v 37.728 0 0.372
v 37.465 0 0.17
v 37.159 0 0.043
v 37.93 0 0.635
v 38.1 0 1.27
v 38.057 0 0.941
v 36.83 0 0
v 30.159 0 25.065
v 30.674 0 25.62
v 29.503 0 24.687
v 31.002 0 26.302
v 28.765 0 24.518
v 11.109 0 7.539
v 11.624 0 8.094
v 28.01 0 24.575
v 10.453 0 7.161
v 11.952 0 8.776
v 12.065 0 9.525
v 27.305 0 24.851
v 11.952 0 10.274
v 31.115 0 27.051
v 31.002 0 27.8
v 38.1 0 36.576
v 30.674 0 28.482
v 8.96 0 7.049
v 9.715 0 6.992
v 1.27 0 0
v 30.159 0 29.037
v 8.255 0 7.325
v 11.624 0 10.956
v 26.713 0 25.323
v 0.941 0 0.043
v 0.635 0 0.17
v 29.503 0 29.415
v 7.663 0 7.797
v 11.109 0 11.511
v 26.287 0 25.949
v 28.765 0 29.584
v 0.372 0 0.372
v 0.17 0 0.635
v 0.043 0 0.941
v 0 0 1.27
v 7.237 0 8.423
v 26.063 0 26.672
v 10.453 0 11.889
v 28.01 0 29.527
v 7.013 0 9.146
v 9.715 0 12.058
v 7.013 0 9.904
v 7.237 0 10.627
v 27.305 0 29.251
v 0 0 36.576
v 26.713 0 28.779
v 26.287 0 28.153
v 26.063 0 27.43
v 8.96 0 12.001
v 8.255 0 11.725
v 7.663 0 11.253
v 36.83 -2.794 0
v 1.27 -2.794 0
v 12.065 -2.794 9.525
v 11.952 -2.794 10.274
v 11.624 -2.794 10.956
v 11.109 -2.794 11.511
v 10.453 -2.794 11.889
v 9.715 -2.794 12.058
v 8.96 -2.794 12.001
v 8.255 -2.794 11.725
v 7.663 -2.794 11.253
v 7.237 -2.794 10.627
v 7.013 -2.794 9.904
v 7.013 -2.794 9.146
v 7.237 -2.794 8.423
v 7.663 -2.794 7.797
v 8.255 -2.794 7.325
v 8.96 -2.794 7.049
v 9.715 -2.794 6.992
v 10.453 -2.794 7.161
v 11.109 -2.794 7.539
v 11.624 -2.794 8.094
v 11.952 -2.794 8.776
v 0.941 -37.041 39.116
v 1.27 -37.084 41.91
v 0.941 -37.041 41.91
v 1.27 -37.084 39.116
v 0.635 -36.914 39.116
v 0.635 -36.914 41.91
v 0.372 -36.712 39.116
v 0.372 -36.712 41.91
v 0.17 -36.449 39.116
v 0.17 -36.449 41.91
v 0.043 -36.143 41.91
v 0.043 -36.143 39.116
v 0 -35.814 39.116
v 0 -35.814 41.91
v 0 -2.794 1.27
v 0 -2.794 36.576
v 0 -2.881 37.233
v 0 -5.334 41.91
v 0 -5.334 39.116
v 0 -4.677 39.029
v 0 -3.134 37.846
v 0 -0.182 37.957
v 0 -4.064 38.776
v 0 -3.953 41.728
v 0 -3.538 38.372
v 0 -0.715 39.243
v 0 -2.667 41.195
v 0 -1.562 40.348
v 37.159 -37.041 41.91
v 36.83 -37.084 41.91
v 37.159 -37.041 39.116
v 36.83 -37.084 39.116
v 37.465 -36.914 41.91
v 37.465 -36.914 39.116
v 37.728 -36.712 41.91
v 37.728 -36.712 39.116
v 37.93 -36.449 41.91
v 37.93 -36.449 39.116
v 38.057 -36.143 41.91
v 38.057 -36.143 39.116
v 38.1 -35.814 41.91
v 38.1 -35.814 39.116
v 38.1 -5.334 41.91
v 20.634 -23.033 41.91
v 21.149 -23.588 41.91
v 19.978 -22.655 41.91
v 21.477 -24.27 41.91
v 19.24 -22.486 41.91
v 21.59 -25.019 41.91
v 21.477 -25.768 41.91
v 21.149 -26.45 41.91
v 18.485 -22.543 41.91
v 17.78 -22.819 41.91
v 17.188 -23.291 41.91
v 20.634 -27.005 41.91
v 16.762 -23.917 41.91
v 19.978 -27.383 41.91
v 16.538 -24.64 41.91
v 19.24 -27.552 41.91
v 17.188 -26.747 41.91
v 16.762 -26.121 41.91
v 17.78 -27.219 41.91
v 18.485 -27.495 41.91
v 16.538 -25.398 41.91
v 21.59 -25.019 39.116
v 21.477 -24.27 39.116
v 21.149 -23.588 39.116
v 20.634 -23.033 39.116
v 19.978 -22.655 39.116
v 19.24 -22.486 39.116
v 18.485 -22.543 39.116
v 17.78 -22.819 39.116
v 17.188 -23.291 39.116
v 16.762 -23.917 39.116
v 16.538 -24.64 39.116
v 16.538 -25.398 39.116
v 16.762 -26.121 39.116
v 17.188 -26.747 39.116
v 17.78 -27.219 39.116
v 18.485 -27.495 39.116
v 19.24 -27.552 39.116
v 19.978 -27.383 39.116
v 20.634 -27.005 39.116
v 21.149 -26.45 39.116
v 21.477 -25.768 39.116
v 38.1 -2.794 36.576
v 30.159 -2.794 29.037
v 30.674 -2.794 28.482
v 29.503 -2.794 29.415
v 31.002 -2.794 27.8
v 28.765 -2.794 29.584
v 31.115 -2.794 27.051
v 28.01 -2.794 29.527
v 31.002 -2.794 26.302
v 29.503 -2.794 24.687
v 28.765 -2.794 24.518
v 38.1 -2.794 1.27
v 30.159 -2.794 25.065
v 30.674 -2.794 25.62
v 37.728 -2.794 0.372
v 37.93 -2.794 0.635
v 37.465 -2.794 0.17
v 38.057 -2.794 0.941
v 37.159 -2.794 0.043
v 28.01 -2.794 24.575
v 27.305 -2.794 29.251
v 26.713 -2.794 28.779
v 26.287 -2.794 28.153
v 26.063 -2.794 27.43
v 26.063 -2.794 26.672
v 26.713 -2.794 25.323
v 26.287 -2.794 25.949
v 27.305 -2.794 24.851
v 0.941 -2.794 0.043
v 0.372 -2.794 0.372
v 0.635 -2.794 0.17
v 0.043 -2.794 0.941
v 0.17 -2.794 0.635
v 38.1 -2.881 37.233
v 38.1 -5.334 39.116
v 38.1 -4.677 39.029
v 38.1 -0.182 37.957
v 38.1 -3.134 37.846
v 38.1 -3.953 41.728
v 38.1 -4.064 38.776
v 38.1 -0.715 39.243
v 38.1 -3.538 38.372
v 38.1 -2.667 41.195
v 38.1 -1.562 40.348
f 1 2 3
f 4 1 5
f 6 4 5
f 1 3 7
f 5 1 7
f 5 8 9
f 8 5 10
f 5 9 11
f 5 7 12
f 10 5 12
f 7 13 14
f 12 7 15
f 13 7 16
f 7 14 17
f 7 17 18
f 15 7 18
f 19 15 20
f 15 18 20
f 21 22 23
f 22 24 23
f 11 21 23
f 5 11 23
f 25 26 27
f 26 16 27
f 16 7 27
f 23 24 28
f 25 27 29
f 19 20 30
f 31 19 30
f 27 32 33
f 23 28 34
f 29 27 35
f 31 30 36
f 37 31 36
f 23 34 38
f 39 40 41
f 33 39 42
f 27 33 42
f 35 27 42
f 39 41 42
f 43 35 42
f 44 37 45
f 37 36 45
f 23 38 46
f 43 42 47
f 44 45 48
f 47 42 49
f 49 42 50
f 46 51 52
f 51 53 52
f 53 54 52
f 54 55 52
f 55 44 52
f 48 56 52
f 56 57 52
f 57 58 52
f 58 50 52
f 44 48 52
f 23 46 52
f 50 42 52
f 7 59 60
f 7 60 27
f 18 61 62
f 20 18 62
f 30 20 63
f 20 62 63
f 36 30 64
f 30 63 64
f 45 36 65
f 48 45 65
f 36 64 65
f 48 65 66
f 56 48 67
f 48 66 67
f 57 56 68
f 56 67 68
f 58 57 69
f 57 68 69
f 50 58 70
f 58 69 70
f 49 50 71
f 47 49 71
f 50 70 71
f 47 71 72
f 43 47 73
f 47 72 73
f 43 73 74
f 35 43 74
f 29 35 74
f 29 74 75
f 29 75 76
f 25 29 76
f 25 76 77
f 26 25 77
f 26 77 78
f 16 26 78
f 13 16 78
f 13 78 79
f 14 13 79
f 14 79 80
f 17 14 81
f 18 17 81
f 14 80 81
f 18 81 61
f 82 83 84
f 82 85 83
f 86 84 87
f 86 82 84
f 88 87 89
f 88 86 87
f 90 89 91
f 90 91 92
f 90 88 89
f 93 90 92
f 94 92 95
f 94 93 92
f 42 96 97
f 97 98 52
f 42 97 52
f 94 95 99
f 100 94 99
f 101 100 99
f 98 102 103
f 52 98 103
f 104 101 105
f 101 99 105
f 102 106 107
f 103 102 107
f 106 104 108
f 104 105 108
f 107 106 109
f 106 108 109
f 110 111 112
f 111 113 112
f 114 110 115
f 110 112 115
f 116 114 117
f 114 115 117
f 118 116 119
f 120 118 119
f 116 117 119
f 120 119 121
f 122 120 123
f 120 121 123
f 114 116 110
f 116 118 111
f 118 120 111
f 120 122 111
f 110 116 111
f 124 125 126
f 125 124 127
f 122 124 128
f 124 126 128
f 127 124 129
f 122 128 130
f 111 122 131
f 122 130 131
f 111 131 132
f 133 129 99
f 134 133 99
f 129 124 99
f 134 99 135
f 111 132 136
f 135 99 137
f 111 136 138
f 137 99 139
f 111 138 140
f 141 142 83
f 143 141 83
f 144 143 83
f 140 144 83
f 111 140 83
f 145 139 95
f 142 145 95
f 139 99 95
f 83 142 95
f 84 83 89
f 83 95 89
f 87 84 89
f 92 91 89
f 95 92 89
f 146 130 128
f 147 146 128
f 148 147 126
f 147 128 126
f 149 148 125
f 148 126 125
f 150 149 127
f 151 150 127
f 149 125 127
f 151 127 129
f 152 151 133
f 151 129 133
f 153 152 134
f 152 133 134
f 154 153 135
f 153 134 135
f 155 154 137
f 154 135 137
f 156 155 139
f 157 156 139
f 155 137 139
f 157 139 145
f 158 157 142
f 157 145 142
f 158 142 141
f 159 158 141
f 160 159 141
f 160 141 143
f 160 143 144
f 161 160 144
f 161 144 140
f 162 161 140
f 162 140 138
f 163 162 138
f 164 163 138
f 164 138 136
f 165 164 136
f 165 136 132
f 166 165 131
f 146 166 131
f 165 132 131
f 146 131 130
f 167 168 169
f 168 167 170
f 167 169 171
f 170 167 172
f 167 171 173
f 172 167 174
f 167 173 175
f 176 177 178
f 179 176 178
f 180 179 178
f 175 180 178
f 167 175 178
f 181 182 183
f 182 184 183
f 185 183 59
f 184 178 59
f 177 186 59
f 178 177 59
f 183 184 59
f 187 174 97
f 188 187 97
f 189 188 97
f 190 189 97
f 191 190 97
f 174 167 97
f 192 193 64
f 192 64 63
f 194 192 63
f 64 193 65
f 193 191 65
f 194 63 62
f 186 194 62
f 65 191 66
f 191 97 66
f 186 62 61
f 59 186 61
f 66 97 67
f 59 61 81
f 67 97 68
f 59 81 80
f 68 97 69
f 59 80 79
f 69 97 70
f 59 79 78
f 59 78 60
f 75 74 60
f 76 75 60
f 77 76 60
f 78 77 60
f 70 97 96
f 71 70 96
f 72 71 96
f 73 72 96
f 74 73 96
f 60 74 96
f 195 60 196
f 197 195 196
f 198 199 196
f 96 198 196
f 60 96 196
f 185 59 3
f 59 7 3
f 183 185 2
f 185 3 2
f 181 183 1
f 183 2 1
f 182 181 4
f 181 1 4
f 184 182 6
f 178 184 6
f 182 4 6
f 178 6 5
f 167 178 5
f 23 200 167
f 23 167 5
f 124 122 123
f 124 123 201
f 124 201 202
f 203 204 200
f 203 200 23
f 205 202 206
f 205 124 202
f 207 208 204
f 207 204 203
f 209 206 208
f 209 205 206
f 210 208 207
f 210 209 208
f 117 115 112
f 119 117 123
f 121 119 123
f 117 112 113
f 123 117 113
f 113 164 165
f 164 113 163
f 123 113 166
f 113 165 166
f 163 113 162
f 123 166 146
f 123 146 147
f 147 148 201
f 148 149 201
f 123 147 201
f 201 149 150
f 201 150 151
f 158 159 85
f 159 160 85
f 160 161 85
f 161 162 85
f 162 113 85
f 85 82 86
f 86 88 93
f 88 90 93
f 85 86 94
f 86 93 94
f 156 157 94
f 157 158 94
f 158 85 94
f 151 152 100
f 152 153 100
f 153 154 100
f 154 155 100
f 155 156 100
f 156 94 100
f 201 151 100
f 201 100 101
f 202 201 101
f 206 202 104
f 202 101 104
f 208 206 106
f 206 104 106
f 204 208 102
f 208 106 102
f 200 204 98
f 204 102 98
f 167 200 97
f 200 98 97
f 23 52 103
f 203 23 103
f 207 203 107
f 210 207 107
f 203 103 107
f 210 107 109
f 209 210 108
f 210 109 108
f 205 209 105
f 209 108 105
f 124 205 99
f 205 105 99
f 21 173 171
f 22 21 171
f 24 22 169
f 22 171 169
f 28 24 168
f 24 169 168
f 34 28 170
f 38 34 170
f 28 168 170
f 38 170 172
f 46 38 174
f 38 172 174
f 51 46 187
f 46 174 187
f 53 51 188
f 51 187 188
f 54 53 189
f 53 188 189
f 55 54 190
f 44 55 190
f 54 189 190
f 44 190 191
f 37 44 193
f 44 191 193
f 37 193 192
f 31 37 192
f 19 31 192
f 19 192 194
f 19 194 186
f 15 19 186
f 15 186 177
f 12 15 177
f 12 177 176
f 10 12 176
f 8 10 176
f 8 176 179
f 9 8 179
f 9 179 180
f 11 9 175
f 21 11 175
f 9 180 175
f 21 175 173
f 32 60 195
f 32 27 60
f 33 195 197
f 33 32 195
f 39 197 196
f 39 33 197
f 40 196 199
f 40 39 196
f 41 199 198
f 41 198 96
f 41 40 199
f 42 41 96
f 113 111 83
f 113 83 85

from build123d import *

# Parameters (mm, degrees)
F1_DEPTH = 38.1
F2_R     = 1.27
F3_R     = 2.54
F4_DEPTH = 2.794
F5_R     = 2.54
F6_DEPTH = 2.794


with BuildPart() as f1:
    # F0 (on Right) → F1 (new body)
    with BuildSketch(Plane.YZ):
        with BuildLine():
            Line((-2.794, 0), (0, 0))
            Line((0, 0), (0, 36.576))
            ThreePointArc((0, 36.576), (-1.562292, 40.347708), (-5.334, 41.91))
            Line((-5.334, 41.91), (-37.084, 41.91))
            Line((-37.084, 41.91), (-37.084, 39.116))
            Line((-37.084, 39.116), (-5.334, 39.116))
            ThreePointArc((-5.334, 39.116), (-3.537949, 38.372051), (-2.794, 36.576))
            Line((-2.794, 36.576), (-2.794, 0))
        make_face()
    extrude(amount=F1_DEPTH)

    # F2
    f2_edges = [f1.edges().sort_by_distance(p)[0] for p in [
        (0, -37.084, 40.513),
        (38.1, -37.084, 40.513),
        (38.1, -1.397, 0),
        (0, -1.397, 0),
    ]]
    fillet(f2_edges, radius=F2_R)

    # F3 (on face) → F4 (cut, through all)
    with BuildSketch(Plane.XY.offset(41.91)):
        with Locations((19.05, -25.019)):
            Circle(F3_R)
    extrude(amount=-F4_DEPTH, mode=Mode.SUBTRACT)

    # F5 (on face) → F6 (cut, through all)
    with BuildSketch(Plane.XZ.offset(2.794)):
        with Locations((28.575, 27.051)):
            Circle(F5_R)
        with Locations((9.525, 9.525)):
            Circle(F5_R)
    extrude(amount=-F6_DEPTH, mode=Mode.SUBTRACT)


solid = f1.part
